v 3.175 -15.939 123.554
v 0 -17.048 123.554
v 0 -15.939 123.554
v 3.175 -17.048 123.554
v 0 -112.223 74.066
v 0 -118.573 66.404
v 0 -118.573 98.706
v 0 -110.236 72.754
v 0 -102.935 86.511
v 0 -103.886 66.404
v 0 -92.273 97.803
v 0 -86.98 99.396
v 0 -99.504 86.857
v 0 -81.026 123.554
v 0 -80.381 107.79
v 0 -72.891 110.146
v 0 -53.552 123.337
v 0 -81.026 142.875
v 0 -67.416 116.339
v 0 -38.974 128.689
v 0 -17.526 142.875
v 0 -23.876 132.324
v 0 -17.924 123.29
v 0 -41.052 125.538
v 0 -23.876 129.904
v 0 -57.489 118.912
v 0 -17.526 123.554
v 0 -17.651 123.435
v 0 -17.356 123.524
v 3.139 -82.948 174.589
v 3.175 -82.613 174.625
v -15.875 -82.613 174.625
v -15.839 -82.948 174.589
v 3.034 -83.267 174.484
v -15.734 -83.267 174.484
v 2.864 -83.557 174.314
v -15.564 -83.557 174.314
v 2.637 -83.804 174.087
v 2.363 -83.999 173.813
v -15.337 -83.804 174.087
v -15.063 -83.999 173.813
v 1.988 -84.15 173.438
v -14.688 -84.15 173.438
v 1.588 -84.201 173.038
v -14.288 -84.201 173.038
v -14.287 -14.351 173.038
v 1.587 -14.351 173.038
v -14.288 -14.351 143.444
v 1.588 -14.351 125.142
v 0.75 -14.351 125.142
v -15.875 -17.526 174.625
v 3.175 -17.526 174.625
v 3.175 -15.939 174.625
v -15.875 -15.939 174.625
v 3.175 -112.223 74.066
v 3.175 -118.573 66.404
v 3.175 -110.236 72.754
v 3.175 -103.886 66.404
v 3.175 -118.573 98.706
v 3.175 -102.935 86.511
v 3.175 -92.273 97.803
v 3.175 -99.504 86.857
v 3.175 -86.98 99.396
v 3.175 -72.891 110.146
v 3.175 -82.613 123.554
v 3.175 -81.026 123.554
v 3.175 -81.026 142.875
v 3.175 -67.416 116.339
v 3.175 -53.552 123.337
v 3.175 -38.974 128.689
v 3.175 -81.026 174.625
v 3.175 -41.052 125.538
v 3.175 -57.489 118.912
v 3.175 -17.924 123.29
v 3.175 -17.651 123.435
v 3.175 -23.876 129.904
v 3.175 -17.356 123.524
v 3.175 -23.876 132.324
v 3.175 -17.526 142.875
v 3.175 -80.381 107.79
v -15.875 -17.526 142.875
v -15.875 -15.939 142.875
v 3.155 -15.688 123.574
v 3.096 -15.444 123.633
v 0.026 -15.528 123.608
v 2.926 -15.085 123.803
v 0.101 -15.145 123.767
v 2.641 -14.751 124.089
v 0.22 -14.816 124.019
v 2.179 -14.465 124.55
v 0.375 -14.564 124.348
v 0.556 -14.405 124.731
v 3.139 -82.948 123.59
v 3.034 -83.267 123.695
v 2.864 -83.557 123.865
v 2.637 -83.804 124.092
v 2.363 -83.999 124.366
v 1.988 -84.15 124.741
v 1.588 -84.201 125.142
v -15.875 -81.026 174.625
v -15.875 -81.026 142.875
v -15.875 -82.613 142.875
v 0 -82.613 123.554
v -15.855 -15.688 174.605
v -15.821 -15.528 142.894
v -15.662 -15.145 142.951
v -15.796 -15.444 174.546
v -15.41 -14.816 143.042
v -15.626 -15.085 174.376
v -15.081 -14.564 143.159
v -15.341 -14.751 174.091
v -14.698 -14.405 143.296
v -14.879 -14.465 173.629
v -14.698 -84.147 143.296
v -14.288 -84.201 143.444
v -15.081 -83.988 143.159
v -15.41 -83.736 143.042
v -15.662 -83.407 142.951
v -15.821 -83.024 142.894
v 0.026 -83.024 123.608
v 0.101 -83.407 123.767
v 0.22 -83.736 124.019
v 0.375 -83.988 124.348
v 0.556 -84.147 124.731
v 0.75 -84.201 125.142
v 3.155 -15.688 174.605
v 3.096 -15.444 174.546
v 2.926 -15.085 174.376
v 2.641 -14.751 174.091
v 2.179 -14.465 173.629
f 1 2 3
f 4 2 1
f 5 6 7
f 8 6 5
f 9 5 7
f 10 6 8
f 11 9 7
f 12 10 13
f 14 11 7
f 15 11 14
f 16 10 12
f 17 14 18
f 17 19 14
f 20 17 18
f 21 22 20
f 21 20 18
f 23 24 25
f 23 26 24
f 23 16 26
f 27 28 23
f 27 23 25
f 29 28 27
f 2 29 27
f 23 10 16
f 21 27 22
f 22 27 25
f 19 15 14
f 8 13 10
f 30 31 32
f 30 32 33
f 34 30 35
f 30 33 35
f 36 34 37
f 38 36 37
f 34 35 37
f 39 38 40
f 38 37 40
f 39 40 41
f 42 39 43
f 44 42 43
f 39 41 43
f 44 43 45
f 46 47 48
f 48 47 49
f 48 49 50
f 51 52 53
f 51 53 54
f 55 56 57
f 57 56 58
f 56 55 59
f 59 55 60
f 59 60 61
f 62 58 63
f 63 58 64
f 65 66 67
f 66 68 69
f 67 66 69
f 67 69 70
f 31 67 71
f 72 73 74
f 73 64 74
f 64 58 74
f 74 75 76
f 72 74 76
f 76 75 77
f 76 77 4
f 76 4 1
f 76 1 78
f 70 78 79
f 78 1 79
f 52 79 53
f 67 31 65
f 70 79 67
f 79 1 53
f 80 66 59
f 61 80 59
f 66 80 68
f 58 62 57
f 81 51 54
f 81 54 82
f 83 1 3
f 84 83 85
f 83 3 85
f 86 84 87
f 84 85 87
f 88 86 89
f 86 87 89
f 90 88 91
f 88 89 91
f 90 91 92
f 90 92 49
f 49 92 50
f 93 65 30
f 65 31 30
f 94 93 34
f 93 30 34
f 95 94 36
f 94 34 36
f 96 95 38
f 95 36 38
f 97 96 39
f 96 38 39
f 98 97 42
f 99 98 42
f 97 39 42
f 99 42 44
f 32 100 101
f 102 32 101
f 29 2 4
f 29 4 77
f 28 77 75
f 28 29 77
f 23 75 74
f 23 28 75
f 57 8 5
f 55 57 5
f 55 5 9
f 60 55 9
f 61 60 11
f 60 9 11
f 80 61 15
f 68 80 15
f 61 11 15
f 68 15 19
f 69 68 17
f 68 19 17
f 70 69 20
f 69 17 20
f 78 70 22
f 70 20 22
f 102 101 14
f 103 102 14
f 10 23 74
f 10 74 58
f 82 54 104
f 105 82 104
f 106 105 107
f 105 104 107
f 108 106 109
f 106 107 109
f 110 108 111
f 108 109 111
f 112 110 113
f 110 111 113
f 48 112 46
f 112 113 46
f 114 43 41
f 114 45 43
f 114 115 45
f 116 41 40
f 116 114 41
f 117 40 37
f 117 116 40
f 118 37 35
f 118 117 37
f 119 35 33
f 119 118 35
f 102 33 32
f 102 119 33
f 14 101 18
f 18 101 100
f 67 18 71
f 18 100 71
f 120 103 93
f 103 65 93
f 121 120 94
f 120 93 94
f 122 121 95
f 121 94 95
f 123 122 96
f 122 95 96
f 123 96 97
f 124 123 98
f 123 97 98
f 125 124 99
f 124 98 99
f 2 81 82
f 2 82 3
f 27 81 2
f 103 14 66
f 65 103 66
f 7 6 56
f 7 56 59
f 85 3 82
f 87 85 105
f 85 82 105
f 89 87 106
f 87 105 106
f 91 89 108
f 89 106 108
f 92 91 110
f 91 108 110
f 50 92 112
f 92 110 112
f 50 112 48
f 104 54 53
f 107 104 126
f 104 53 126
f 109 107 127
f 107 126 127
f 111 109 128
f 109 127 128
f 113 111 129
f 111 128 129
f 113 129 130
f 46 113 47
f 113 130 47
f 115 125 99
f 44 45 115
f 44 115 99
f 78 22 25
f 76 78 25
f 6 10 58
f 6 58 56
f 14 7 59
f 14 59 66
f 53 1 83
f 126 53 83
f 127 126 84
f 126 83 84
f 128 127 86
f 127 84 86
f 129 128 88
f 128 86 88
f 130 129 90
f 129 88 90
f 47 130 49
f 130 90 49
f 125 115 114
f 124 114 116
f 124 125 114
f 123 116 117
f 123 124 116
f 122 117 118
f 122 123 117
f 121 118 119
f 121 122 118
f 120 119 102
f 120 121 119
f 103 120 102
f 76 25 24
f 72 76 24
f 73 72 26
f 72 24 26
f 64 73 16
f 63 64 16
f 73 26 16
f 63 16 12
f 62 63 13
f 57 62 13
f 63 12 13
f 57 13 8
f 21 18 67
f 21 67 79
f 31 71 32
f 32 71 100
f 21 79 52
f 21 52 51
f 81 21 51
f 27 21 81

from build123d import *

# Parameters (mm, degrees)
BOSS_EXTRUDE1_DEPTH = 3.175
BOSS_EXTRUDE2_DEPTH = 3.175
FILLET1_R           = 1.5875
BOSS_EXTRUDE3_DEPTH = 3.175
FILLET2_R           = 1.5875


with BuildPart() as part:
    # Sketch1 → Boss-Extrude1 (new body)
    with BuildSketch(Plane(origin=(0, 0, 0), x_dir=(0, 0, -1), z_dir=(1, 0, 0))):
        Polygon((-123.554053147, -17.526), (-66.404053147, -103.885992991), (-66.404053147, -118.573420749), (-98.706493282, -118.573420749), (-123.554053147, -81.026), (-142.875, -81.026), (-142.875, -17.526), align=None)
        with BuildLine():
            Line((-132.324466277, -23.876), (-129.904053147, -23.876))
            ThreePointArc((-129.904053147, -23.876), (-110.14576301, -72.890584378), (-72.754053147, -110.235992991))
            Line((-72.754053147, -110.235992991), (-74.065724778, -112.223420749))
            ThreePointArc((-74.065724778, -112.223420749), (-112.252146658, -74.022181286), (-132.324466277, -23.876))
        make_face(mode=Mode.SUBTRACT)
    extrude(amount=BOSS_EXTRUDE1_DEPTH)

    # Sketch2 → Boss-Extrude2 (add)
    with BuildSketch(Plane(origin=(0, -17.526, 0), x_dir=(1, 0, 0), z_dir=(0, 1, 0))):
        Polygon((0, -123.554053147), (3.175, -123.554053147), (3.175, -174.625), (-15.875, -174.625), (-15.875, -142.875), align=None)
    extrude(amount=BOSS_EXTRUDE2_DEPTH)

    # Fillet1
    # the kernel refuses this fillet: 1.5875 mm, written as the material it adds along each edge
    with BuildSketch(Plane(origin=(0, -17.526, 123.554053147), x_dir=(0, -0.8339321851132224, -0.5518669319974573), z_dir=(1, 0, 0))) as fillet1_piece_1:
        with BuildLine():
            CenterArc((FILLET1_R * 0.300920032091, FILLET1_R), FILLET1_R, 236.504813186, 33.495186814)
            Line((-FILLET1_R * 0.250946899906, FILLET1_R * 0.166067814887), (0, 0))
            Line((0, 0), (FILLET1_R * 0.300920032091, 0))
        make_face()
    extrude(amount=3.175)
    # the kernel refuses this fillet: 1.5875 mm, written as the material it takes off along each edge
    with BuildSketch(Plane(origin=(-18.394522192, -14.351, 145.941428621), x_dir=(0.7726434320880118, 0, 0.6348402372654539), z_dir=(0.634840237265454, 0, -0.7726434320880119))) as fillet1_2_piece_1:
        with BuildLine():
            CenterArc((FILLET1_R, FILLET1_R), FILLET1_R, 180, 90)
            Line((0, FILLET1_R), (0, 0))
            Line((0, 0), (FILLET1_R, 0))
        make_face()
    extrude(amount=32.943791454, mode=Mode.SUBTRACT)
    with BuildSketch(Plane(origin=(-15.875, -14.351, 178.59375), x_dir=(1, 0, 0), z_dir=(0, 0, -1))) as fillet1_2_piece_2:
        with BuildLine():
            CenterArc((FILLET1_R, FILLET1_R), FILLET1_R, 180, 90)
            Line((0, FILLET1_R), (0, 0))
            Line((0, 0), (FILLET1_R, 0))
        make_face()
    extrude(amount=39.6875, mode=Mode.SUBTRACT)
    with BuildSketch(Plane(origin=(7.14375, -14.351, 174.625), x_dir=(0, -1, 0), z_dir=(-1, 0, 0))) as fillet1_2_piece_3:
        with BuildLine():
            CenterArc((FILLET1_R, -FILLET1_R), FILLET1_R, 90, 90)
            Line((0, -FILLET1_R), (0, 0))
            Line((0, 0), (FILLET1_R, 0))
        make_face()
    extrude(amount=26.9875, mode=Mode.SUBTRACT)
    with BuildSketch(Plane(origin=(3.175, -14.351, 119.585303147), x_dir=(0, -1, 0), z_dir=(0, 0, 1))) as fillet1_2_piece_4:
        with BuildLine():
            CenterArc((FILLET1_R, -FILLET1_R), FILLET1_R, 90, 90)
            Line((0, -FILLET1_R), (0, 0))
            Line((0, 0), (FILLET1_R, 0))
        make_face()
    extrude(amount=59.008446853, mode=Mode.SUBTRACT)
    with BuildSketch(Plane(origin=(-3.96875, -14.351, 123.554053147), x_dir=(0, 0, 1), z_dir=(1, 0, 0))) as fillet1_2_piece_5:
        with BuildLine():
            CenterArc((FILLET1_R, FILLET1_R), FILLET1_R, 180, 90)
            Line((0, FILLET1_R), (0, 0))
            Line((0, 0), (FILLET1_R, 0))
        make_face()
    extrude(amount=11.1125, mode=Mode.SUBTRACT)

    # Sketch4 → Boss-Extrude3 (add)
    with BuildSketch(Plane.XZ.offset(81.026)):
        Polygon((3.175, 123.554053147), (3.175, 174.625), (-15.875, 174.625), (-15.875, 142.875), (0, 123.554053147), align=None)
    extrude(amount=BOSS_EXTRUDE3_DEPTH)

    # Fillet2
    fillet2_edges = [part.edges().sort_by_distance(p)[0] for p in [
        (1.5875, -84.201, 123.554053147),
        (3.175, -84.201, 149.089526573),
        (-6.35, -84.201, 174.625),
        (-15.875, -84.201, 158.75),
        (-7.9375, -84.201, 133.214526573),
    ]]
    fillet(fillet2_edges, radius=FILLET2_R)


solid = part.part
